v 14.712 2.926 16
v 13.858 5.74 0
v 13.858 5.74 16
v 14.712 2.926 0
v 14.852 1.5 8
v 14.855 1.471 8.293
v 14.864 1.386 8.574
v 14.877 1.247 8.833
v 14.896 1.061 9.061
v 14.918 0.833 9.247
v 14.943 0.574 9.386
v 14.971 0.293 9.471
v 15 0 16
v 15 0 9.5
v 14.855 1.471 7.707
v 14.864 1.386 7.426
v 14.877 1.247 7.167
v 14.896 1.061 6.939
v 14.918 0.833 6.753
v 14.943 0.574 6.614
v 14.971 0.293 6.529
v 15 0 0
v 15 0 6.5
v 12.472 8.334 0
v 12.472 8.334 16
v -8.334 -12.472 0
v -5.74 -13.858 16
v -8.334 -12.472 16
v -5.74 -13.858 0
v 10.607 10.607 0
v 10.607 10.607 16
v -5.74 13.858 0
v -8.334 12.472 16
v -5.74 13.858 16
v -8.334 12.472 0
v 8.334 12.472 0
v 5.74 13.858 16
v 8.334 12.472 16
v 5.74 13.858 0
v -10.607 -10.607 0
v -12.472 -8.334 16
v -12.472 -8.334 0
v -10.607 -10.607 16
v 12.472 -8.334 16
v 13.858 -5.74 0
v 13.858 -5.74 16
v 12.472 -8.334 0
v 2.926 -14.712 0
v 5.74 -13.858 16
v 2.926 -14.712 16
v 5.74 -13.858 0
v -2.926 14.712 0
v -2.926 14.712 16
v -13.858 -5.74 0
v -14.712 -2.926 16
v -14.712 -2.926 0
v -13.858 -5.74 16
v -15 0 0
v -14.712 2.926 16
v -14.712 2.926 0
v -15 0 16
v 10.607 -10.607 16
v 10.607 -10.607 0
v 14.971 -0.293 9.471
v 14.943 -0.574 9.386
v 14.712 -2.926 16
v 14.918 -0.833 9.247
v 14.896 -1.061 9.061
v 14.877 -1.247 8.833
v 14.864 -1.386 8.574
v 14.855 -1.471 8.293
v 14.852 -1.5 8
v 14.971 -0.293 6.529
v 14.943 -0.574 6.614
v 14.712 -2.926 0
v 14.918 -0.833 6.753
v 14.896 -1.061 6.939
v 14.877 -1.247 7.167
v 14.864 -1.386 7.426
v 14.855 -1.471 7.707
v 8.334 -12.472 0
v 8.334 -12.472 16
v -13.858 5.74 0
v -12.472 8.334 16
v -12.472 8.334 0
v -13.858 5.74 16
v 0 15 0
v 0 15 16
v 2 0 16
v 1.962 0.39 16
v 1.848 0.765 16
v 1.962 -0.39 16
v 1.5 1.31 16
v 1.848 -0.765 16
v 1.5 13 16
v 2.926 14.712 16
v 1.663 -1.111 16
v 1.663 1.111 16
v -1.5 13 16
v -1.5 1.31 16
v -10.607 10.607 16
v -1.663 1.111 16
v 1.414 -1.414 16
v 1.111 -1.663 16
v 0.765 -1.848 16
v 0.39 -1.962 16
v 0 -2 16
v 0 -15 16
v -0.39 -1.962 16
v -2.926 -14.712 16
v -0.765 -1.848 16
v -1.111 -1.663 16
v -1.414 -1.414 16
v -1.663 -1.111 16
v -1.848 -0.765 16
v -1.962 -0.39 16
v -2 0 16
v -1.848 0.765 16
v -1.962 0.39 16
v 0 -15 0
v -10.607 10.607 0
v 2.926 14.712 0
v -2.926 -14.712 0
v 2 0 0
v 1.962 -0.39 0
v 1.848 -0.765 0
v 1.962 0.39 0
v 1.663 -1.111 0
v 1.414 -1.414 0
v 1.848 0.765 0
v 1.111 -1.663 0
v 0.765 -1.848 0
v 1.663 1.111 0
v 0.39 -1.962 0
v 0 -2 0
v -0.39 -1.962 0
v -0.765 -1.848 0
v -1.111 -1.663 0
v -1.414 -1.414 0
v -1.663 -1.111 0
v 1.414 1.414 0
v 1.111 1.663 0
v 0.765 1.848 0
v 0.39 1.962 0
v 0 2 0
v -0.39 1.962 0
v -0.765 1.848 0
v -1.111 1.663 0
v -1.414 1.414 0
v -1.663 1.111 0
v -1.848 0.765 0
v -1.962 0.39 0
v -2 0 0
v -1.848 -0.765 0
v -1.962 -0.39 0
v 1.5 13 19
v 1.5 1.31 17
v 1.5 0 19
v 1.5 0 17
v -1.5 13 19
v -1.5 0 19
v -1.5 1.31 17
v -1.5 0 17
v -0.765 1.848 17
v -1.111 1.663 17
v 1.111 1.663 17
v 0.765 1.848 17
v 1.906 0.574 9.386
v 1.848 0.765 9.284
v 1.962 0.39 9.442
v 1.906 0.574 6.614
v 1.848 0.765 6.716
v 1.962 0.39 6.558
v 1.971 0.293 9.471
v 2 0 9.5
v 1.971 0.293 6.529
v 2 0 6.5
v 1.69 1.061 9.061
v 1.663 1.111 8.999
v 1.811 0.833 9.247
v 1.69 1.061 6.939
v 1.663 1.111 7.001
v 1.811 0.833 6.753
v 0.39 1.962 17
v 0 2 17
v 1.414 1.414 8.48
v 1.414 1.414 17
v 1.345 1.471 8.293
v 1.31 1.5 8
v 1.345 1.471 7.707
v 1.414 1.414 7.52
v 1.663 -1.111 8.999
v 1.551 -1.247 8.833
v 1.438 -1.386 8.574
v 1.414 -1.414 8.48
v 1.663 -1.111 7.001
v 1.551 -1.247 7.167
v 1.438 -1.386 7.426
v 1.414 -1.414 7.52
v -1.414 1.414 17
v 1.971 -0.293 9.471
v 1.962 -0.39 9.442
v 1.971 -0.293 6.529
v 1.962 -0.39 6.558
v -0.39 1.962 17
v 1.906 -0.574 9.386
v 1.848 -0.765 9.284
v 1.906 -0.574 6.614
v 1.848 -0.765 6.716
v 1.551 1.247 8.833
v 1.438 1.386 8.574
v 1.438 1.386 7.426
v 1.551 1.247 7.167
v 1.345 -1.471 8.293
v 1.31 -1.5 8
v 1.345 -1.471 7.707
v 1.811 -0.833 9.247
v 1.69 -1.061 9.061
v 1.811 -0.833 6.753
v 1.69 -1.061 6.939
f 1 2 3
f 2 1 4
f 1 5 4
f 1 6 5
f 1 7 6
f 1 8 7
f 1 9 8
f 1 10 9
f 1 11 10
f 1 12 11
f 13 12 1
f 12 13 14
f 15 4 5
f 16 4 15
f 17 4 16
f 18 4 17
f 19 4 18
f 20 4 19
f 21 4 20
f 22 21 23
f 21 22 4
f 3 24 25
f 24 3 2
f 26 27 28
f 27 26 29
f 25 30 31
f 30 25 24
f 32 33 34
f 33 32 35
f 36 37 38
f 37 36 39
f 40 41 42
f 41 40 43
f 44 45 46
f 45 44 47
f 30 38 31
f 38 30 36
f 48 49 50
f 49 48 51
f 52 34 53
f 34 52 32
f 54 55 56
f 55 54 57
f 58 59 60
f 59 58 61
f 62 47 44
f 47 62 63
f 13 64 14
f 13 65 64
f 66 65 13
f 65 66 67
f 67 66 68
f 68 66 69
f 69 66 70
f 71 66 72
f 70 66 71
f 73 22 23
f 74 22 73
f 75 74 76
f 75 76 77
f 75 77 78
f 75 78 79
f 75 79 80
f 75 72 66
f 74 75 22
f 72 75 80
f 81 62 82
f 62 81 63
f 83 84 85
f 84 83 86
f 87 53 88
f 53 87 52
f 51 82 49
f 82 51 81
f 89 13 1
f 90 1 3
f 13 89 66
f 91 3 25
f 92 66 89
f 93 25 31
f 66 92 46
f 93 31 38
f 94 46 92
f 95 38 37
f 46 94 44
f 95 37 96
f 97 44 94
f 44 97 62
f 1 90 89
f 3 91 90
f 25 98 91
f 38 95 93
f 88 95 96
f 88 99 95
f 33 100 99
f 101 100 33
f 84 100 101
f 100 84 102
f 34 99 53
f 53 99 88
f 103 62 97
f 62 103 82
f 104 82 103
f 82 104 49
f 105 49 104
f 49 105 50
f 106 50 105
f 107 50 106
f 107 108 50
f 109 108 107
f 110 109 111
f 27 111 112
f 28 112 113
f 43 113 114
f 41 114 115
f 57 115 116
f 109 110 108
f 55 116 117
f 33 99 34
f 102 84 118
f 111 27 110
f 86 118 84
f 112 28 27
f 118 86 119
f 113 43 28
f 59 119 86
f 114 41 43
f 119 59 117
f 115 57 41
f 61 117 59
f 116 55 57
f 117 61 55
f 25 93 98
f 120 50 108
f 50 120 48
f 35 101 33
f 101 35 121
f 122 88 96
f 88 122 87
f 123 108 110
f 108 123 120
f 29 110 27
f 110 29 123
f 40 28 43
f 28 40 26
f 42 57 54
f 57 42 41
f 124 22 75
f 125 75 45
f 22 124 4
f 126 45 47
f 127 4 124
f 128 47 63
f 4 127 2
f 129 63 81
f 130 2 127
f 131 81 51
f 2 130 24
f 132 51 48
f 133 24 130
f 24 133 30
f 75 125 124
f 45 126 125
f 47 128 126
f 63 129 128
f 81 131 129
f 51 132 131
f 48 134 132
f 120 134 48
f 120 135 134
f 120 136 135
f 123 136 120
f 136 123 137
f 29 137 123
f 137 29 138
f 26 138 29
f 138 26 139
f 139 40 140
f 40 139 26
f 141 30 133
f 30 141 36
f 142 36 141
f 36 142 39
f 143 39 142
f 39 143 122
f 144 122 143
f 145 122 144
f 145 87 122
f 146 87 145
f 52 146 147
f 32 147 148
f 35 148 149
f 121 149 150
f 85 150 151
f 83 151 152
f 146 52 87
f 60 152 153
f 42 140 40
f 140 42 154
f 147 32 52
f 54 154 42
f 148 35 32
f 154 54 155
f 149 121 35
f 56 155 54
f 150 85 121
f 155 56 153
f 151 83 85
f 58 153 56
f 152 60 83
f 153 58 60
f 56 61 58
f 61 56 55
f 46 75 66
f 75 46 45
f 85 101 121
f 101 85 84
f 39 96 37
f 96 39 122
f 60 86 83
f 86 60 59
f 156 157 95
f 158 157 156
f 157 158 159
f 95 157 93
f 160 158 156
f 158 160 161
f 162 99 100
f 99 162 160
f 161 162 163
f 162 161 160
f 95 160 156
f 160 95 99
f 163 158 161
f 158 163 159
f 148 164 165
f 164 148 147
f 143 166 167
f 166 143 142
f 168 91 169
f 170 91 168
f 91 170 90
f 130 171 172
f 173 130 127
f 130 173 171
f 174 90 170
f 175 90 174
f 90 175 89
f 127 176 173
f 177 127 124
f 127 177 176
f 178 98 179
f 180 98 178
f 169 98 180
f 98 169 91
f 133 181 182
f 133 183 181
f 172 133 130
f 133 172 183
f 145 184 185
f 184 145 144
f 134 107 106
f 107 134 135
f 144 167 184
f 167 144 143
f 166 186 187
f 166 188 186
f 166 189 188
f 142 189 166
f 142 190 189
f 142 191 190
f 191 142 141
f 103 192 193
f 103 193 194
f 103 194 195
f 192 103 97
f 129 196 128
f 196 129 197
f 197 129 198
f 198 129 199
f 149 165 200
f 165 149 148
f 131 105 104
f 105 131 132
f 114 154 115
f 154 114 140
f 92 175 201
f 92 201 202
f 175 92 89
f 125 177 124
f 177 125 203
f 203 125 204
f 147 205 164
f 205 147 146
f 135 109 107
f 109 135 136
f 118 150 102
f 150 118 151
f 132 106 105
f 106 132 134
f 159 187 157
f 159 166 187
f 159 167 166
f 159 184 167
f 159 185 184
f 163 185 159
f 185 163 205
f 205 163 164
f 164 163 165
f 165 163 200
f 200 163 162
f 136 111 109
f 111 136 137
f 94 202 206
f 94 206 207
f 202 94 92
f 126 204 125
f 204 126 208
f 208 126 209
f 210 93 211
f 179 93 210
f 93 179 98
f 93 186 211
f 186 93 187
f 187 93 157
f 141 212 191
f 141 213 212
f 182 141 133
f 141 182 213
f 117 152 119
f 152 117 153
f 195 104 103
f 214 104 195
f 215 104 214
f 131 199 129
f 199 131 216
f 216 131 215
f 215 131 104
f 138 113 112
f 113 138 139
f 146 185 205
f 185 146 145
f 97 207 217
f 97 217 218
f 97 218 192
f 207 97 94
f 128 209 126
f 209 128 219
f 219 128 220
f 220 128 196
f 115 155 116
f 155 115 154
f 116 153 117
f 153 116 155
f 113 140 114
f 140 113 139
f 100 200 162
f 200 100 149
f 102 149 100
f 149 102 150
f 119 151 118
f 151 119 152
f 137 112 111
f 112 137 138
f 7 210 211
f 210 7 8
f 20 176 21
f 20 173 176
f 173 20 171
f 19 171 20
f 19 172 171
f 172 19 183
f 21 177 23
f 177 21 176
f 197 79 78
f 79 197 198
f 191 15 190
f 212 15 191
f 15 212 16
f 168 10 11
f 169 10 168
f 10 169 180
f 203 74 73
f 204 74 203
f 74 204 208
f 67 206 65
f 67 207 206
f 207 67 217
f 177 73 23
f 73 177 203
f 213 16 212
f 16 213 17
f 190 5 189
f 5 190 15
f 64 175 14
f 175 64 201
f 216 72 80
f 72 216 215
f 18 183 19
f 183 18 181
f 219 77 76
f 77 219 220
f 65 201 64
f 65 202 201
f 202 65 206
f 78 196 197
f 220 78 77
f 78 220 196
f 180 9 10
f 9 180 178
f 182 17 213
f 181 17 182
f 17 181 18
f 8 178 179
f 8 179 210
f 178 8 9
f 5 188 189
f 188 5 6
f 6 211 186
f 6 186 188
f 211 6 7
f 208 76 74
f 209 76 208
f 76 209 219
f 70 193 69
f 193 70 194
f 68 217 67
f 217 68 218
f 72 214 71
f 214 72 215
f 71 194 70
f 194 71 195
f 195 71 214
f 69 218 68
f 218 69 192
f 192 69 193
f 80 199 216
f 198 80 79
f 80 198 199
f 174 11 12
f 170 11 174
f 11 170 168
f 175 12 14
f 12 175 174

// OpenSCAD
$fn = 32;

// ----------------------------------------------------------------------
// Control knob: pointer knob
// ----------------------------------------------------------------------

// --- parameters (mm) ---
rib_w = 3;                // pointer rib width
rib_h = 4;                // pointer rib height
knob_d = 30;              // knob body diameter
knob_h = 16;              // knob body height
bore_d = 4;               // shaft bore diameter
set_d = 3;                // set screw bore diameter

rib_poke = rib_h - 1;  // rib height above the top
total_h = knob_h + rib_h - 1;  // overall height

difference() {
  union() {
    cylinder(h = knob_h, d = knob_d);
    translate([-rib_w / 2, 0, knob_h - 1])
      cube([rib_w, knob_d / 2 - 2, rib_h]);
  }
  translate([0, 0, -1]) cylinder(h = knob_h + 2, d = bore_d);
  translate([-1, 0, knob_h / 2]) rotate([0, 90, 0])
    cylinder(h = knob_d / 2 + bore_d / 2 + 2, d = set_d);}
